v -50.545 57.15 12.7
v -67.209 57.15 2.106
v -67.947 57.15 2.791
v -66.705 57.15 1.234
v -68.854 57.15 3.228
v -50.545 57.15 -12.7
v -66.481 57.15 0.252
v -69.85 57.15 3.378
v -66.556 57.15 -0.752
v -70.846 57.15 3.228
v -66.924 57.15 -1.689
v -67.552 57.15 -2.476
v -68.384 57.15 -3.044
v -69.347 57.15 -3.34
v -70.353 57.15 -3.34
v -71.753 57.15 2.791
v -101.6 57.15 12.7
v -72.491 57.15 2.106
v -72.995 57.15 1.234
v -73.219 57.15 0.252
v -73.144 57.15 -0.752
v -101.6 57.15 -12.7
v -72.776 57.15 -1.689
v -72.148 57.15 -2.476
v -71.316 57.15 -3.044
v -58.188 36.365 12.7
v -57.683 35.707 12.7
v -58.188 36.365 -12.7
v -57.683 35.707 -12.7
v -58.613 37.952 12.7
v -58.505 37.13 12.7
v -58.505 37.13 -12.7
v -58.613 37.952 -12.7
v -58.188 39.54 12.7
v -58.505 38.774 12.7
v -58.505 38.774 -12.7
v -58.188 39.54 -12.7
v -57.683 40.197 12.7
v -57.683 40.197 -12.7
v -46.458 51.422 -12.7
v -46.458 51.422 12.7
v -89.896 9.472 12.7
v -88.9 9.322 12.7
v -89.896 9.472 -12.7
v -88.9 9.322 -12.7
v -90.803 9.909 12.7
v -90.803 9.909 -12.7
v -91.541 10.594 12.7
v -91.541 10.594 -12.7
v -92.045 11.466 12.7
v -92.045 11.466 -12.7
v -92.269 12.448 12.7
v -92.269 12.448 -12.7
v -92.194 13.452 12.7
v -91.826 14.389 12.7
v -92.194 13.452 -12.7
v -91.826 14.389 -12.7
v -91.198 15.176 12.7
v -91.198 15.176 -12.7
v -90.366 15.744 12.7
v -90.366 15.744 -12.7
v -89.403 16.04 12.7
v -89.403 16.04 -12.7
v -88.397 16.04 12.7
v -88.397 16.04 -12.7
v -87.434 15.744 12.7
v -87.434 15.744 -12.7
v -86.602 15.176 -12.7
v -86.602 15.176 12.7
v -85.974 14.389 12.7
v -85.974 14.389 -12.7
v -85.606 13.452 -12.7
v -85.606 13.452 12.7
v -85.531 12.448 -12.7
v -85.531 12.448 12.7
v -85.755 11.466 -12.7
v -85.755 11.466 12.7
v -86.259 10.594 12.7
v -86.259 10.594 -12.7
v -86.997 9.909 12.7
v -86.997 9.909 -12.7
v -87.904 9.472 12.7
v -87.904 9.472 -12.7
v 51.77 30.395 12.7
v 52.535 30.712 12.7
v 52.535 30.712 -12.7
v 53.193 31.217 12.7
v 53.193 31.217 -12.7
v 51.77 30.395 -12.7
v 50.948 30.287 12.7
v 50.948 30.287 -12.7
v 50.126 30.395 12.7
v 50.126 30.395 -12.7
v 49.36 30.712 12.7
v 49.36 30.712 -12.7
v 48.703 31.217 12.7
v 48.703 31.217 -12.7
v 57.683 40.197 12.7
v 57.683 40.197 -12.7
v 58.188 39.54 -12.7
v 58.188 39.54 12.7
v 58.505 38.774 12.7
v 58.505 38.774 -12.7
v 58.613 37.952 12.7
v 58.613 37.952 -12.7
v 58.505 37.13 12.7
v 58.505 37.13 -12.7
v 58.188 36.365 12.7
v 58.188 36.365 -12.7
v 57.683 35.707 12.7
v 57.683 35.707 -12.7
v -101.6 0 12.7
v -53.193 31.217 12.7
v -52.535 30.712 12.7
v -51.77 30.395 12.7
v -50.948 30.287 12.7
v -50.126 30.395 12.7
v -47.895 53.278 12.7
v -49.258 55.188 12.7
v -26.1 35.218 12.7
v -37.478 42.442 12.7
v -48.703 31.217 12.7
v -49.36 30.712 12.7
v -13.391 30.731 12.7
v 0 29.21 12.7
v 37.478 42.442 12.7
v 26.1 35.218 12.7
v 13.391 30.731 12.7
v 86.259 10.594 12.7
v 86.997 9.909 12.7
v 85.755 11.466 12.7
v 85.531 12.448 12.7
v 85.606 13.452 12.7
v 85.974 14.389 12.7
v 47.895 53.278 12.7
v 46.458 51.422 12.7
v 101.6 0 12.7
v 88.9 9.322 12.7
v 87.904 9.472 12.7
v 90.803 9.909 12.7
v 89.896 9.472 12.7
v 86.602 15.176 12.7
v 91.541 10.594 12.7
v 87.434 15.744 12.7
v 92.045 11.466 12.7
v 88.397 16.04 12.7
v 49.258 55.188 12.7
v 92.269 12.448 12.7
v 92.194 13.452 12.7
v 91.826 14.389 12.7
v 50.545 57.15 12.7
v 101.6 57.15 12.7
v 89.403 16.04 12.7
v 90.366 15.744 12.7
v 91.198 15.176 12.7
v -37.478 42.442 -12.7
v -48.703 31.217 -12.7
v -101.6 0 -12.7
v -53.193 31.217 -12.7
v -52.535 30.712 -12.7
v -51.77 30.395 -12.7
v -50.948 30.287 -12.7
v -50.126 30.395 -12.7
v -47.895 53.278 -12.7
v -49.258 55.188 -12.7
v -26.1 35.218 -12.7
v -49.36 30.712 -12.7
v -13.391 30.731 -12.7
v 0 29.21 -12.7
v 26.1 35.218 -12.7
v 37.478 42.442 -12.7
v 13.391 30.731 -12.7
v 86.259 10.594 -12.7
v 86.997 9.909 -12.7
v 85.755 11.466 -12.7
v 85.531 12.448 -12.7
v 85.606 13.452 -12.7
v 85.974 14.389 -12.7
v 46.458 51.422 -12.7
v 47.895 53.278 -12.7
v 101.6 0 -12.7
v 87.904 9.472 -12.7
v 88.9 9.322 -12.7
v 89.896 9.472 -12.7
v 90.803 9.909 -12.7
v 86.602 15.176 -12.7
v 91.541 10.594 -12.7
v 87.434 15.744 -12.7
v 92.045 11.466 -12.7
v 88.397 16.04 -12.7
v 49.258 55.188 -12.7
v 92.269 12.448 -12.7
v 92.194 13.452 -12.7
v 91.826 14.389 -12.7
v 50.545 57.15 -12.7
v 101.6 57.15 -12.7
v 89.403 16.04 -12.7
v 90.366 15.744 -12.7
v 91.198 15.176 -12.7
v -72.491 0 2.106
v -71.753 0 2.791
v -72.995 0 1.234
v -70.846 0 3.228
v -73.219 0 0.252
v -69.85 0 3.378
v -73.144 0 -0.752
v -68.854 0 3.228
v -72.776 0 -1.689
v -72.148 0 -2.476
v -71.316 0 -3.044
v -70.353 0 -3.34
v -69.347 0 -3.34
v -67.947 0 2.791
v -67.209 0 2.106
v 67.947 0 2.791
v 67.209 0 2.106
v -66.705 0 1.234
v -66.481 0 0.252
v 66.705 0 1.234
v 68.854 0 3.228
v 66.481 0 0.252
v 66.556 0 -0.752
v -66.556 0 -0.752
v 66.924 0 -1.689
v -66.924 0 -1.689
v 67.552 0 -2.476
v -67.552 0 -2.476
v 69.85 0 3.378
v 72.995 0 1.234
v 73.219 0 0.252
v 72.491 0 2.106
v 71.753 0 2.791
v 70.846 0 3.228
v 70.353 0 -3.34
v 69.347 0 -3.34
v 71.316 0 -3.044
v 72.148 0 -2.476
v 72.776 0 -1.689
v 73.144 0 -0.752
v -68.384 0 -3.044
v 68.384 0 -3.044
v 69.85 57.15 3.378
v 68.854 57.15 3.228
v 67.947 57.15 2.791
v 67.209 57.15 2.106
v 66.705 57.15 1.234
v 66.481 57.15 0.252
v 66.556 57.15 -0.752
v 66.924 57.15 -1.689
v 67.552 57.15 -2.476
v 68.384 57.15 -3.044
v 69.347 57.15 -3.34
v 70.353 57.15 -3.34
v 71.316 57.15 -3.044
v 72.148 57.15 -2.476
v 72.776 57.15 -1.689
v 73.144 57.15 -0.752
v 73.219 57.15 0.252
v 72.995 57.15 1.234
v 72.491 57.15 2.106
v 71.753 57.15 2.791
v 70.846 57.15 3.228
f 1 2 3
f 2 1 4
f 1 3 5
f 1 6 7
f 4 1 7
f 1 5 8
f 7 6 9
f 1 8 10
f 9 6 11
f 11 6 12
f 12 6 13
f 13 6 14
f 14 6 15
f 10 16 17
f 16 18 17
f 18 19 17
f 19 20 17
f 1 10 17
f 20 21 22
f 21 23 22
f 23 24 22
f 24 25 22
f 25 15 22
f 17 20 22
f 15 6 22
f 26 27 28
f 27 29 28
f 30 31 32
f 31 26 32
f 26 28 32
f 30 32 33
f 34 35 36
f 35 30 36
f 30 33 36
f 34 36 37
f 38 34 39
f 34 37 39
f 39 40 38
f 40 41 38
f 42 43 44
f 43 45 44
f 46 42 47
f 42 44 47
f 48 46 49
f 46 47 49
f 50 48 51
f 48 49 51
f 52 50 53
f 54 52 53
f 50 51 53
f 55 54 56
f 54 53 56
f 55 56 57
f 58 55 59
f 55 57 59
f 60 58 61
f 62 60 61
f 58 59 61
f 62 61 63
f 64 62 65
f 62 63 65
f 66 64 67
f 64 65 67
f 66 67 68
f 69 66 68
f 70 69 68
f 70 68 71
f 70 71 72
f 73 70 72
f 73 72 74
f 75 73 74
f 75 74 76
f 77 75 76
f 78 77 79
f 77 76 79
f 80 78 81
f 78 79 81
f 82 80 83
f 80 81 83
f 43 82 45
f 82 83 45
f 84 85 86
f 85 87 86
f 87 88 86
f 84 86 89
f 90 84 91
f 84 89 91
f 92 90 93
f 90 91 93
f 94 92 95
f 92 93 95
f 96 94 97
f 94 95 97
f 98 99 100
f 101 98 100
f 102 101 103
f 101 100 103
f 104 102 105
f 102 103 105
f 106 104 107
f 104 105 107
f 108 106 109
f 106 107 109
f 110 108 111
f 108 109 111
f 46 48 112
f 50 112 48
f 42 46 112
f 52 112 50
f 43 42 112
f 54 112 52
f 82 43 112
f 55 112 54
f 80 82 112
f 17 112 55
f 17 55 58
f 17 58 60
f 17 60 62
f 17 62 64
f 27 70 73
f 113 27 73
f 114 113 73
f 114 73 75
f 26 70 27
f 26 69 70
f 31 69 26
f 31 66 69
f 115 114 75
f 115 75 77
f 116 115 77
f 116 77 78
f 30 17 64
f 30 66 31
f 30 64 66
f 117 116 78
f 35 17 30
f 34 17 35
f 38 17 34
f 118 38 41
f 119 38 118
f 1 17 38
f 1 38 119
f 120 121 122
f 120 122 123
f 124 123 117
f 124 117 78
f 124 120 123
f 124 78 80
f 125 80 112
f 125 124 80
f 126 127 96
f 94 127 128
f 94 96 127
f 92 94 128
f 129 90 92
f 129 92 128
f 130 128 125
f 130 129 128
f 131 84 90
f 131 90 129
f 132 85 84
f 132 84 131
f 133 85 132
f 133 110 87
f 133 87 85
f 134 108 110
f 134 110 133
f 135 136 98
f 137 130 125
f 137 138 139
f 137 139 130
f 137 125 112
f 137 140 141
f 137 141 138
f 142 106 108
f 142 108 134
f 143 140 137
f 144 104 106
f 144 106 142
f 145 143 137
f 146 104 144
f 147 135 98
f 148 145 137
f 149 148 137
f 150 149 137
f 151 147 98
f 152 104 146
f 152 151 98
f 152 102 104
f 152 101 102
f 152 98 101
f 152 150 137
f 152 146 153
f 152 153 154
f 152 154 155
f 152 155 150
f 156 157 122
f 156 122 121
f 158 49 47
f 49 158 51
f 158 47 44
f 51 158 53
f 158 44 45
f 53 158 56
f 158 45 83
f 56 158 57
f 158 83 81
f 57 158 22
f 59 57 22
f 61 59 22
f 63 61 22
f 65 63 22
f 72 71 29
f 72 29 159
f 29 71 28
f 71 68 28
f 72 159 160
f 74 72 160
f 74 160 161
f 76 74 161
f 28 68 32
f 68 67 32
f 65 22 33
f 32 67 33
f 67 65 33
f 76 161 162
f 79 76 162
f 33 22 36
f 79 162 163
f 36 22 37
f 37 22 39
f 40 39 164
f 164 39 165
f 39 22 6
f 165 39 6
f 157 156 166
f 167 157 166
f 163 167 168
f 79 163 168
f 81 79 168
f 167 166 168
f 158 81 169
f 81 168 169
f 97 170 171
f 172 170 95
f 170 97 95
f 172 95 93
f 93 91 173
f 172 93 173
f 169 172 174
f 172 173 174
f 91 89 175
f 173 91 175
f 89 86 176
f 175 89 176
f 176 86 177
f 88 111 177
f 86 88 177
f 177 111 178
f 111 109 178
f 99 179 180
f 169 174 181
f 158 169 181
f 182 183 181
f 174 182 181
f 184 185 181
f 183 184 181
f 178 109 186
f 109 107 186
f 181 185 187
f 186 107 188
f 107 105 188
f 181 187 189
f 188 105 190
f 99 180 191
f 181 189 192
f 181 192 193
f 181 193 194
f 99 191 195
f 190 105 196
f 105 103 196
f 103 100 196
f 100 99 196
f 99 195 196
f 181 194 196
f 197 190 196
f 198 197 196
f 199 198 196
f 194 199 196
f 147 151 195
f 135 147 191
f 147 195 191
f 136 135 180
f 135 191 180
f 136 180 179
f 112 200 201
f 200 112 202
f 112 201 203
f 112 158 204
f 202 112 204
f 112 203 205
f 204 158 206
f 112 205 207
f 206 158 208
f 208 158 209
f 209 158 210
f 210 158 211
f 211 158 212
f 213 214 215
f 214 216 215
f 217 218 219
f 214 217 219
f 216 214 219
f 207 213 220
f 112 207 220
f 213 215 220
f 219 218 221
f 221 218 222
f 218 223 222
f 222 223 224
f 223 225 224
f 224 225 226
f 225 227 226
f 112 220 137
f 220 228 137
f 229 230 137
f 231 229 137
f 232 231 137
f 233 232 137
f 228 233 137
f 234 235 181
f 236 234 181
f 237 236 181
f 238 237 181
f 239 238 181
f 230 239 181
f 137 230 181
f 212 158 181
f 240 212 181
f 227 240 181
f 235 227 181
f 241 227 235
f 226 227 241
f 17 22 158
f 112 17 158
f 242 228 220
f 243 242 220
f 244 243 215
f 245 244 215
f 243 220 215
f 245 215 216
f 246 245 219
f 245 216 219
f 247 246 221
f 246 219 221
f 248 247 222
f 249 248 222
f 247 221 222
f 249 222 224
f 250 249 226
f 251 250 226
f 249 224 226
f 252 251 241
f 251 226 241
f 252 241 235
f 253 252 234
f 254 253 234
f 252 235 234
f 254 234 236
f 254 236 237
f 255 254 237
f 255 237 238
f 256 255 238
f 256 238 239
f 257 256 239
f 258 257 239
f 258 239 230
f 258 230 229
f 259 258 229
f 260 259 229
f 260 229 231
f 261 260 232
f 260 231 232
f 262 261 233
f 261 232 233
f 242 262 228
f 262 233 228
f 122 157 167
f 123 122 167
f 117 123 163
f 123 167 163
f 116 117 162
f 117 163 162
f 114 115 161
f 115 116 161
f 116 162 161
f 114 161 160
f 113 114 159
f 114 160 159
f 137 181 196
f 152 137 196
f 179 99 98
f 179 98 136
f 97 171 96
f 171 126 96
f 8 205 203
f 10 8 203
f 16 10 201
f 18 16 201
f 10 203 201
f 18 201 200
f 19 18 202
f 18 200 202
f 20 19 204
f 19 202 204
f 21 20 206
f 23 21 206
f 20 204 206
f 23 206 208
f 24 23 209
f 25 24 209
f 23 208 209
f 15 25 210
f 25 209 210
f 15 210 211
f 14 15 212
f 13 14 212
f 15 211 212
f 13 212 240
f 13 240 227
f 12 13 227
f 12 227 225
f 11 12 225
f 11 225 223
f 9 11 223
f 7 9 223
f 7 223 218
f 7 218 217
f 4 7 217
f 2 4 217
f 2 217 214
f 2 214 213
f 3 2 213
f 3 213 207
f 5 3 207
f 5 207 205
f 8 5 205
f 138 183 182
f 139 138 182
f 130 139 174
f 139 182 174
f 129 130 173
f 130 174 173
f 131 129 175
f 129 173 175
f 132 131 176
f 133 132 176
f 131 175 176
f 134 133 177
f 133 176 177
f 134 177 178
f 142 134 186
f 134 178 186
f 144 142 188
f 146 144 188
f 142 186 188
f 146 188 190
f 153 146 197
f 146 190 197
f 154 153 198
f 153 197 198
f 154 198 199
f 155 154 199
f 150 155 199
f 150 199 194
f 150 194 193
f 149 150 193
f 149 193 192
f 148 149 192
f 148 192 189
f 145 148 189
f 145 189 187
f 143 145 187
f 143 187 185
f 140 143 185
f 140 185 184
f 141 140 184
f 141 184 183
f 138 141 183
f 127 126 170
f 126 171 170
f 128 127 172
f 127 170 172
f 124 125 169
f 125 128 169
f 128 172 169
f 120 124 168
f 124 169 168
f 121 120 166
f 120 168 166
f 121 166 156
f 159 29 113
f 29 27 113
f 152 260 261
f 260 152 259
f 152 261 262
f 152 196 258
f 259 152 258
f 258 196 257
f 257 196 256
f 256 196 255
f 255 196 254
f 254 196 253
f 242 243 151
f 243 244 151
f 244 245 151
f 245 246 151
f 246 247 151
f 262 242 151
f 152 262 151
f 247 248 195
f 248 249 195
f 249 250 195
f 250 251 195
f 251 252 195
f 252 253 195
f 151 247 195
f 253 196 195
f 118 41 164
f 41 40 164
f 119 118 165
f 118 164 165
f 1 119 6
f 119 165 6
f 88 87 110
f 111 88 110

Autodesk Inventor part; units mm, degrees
ref_plane "YZ Plane" through (0, 0, 0) normal (1, 0, 0) x (0, 1, 0)
ref_plane "XZ Plane" through (0, 0, 0) normal (0, 1, 0) x (-1, 0, 0)
ref_plane "XY Plane" through (0, 0, 0) normal (0, 0, 1) x (1, 0, 0)
sketch "Sketch1" plane through (0, 0, 0) normal (0, 0, 1) x (1, 0, 0)
  arc A0 (-50.5454, 57.15) -> (50.5454, 57.15) centre (0, 88.9) ccw
  line L0 (-50.5454, 57.15) -> (-101.6, 57.15)
  line L1 (-101.6, 57.15) -> (-101.6, 0)
  line L2 (-101.6, 0) -> (101.6, 0)
  line L3 (101.6, 0) -> (101.6, 57.15)
  line L4 (101.6, 57.15) -> (50.5454, 57.15)
  line L5 (-142.24, 0) -> (142.24, 0) projected
  line L6 (0, 57.6383) -> (0, -27.9062) construction
  line L7 (0, -51.2675) -> (0, 112.2612) projected
  point P0 (0, 0)
  dimension "d32" = 57.15
  dimension "d33" = 59.69
  dimension "d63" = 88.9
  dimension "d64" = 203.2
  dimension "d65" = 101.6
extrude "Extrusion1" add sketch "Sketch1" along normal mid plane 25.4
sketch "Sketch2" plane through (-101.6, 57.15, 12.7) normal (0, 1, 0) x (1, 0, 0)
  line L0 (51.0546, 25.4) -> (51.0546, 0) projected
  line L1 (51.0546, 0) -> (0, 0) projected
  line L2 (152.1454, 25.4) -> (152.1454, 0) projected
  line L3 (203.2, 0) -> (152.1454, 0) projected
  line L4 (203.2, 25.4) -> (203.2, 0) projected
  line L5 (0, 0) -> (0, 25.4) projected
  point P0 (101.6, 12.7)
  point P1 (31.75, 12.7)
  point P2 (171.45, 12.7)
  dimension "d16" = 12.7
  dimension "d18" = 12.7
  dimension "d19" = 31.75
  dimension "d20" = 31.75
hole "Hole1" at (-69.85, 57.15, 0) at (69.85, 57.15, 0) direction (0, -1, 0) diameter 6.7564 end through all clearance for "Socket Head Cap Screw" size "1/4" standard "Ansi Unified Screw Threads"
sketch "Sketch4" plane through (0, 0, 12.7) normal (0, 0, 1) x (1, 0, 0)
  line L0 (-46.4578, 51.4224) -> (-59.9282, 37.9521)
  line L1 (-59.9282, 37.9521) -> (-50.9479, 28.9718)
  line L2 (-50.9479, 28.9718) -> (-37.4776, 42.4422)
  line L3 (-37.4776, 42.4422) -> (-46.4578, 51.4224)
  line L4 (37.4776, 42.4422) -> (50.9479, 28.9718)
  line L5 (50.9479, 28.9718) -> (59.9282, 37.9521)
  line L6 (59.9282, 37.9521) -> (46.4578, 51.4224)
  line L7 (46.4578, 51.4224) -> (37.4776, 42.4422)
  line L8 (0, 53.9269) -> (0, 0) construction
  line L9 (-101.6, 0) -> (101.6, 0) projected
  arc A0 (-50.5454, 57.15) -> (50.5454, 57.15) centre (0, 88.9) ccw projected
  line L10 (34.6064, 54.2936) -> (52.2131, 36.6869) construction
  line L11 (-58.7882, 30.1118) -> (-24.955, 63.945) construction
  point P0 (46.4578, 51.4224)
  point P1 (-46.4578, 51.4224)
  dimension "d35" = 90
  dimension "d36" = 45
  dimension "d38" = 12.7
  dimension "d39" = 12.7
  dimension "d42" = 6.35
  dimension "d43" = 6.35
  dimension "d46" = 19.05
  dimension "d51" = 19.05
extrude "Extrusion2" cut sketch "Sketch4" against normal through all contours A0 L2 L1 L0 | A0 L6 L5 L4
fillet "Fillet2" radius 3.175 4 edges at (-59.9282, 37.9521, 0) (-50.9479, 28.9718, 0) (50.9479, 28.9718, 0) (59.9282, 37.9521, 0)
sketch "Sketch10" plane through (0, 0, 12.7) normal (0, 0, 1) x (1, 0, 0)
  line L0 (88.9, 12.7) -> (-88.9, 12.7) construction
  line L1 (-101.6, 0) -> (101.6, 0) projected
  point P0 (0, 0)
  dimension "d91" = 177.8
  dimension "d92" = 88.9
  dimension "d93" = 12.7
hole "Hole5" at (88.9, 12.7, 12.7) at (-88.9, 12.7, 12.7) direction (0, 0, -1) diameter 6.7564 end through all clearance for "Socket Head Cap Screw" size "1/4" standard "Ansi Unified Screw Threads"
equation "\"d36\" = 0.5 * d35"
equation "\"d42\" = 0.5 * d39"
equation "\"d43\" = 0.5 * d38"
equation "\"d92\" = 0.5 * d91"
properties part number "ODSY-0007-004" material "Aluminum 6061"
